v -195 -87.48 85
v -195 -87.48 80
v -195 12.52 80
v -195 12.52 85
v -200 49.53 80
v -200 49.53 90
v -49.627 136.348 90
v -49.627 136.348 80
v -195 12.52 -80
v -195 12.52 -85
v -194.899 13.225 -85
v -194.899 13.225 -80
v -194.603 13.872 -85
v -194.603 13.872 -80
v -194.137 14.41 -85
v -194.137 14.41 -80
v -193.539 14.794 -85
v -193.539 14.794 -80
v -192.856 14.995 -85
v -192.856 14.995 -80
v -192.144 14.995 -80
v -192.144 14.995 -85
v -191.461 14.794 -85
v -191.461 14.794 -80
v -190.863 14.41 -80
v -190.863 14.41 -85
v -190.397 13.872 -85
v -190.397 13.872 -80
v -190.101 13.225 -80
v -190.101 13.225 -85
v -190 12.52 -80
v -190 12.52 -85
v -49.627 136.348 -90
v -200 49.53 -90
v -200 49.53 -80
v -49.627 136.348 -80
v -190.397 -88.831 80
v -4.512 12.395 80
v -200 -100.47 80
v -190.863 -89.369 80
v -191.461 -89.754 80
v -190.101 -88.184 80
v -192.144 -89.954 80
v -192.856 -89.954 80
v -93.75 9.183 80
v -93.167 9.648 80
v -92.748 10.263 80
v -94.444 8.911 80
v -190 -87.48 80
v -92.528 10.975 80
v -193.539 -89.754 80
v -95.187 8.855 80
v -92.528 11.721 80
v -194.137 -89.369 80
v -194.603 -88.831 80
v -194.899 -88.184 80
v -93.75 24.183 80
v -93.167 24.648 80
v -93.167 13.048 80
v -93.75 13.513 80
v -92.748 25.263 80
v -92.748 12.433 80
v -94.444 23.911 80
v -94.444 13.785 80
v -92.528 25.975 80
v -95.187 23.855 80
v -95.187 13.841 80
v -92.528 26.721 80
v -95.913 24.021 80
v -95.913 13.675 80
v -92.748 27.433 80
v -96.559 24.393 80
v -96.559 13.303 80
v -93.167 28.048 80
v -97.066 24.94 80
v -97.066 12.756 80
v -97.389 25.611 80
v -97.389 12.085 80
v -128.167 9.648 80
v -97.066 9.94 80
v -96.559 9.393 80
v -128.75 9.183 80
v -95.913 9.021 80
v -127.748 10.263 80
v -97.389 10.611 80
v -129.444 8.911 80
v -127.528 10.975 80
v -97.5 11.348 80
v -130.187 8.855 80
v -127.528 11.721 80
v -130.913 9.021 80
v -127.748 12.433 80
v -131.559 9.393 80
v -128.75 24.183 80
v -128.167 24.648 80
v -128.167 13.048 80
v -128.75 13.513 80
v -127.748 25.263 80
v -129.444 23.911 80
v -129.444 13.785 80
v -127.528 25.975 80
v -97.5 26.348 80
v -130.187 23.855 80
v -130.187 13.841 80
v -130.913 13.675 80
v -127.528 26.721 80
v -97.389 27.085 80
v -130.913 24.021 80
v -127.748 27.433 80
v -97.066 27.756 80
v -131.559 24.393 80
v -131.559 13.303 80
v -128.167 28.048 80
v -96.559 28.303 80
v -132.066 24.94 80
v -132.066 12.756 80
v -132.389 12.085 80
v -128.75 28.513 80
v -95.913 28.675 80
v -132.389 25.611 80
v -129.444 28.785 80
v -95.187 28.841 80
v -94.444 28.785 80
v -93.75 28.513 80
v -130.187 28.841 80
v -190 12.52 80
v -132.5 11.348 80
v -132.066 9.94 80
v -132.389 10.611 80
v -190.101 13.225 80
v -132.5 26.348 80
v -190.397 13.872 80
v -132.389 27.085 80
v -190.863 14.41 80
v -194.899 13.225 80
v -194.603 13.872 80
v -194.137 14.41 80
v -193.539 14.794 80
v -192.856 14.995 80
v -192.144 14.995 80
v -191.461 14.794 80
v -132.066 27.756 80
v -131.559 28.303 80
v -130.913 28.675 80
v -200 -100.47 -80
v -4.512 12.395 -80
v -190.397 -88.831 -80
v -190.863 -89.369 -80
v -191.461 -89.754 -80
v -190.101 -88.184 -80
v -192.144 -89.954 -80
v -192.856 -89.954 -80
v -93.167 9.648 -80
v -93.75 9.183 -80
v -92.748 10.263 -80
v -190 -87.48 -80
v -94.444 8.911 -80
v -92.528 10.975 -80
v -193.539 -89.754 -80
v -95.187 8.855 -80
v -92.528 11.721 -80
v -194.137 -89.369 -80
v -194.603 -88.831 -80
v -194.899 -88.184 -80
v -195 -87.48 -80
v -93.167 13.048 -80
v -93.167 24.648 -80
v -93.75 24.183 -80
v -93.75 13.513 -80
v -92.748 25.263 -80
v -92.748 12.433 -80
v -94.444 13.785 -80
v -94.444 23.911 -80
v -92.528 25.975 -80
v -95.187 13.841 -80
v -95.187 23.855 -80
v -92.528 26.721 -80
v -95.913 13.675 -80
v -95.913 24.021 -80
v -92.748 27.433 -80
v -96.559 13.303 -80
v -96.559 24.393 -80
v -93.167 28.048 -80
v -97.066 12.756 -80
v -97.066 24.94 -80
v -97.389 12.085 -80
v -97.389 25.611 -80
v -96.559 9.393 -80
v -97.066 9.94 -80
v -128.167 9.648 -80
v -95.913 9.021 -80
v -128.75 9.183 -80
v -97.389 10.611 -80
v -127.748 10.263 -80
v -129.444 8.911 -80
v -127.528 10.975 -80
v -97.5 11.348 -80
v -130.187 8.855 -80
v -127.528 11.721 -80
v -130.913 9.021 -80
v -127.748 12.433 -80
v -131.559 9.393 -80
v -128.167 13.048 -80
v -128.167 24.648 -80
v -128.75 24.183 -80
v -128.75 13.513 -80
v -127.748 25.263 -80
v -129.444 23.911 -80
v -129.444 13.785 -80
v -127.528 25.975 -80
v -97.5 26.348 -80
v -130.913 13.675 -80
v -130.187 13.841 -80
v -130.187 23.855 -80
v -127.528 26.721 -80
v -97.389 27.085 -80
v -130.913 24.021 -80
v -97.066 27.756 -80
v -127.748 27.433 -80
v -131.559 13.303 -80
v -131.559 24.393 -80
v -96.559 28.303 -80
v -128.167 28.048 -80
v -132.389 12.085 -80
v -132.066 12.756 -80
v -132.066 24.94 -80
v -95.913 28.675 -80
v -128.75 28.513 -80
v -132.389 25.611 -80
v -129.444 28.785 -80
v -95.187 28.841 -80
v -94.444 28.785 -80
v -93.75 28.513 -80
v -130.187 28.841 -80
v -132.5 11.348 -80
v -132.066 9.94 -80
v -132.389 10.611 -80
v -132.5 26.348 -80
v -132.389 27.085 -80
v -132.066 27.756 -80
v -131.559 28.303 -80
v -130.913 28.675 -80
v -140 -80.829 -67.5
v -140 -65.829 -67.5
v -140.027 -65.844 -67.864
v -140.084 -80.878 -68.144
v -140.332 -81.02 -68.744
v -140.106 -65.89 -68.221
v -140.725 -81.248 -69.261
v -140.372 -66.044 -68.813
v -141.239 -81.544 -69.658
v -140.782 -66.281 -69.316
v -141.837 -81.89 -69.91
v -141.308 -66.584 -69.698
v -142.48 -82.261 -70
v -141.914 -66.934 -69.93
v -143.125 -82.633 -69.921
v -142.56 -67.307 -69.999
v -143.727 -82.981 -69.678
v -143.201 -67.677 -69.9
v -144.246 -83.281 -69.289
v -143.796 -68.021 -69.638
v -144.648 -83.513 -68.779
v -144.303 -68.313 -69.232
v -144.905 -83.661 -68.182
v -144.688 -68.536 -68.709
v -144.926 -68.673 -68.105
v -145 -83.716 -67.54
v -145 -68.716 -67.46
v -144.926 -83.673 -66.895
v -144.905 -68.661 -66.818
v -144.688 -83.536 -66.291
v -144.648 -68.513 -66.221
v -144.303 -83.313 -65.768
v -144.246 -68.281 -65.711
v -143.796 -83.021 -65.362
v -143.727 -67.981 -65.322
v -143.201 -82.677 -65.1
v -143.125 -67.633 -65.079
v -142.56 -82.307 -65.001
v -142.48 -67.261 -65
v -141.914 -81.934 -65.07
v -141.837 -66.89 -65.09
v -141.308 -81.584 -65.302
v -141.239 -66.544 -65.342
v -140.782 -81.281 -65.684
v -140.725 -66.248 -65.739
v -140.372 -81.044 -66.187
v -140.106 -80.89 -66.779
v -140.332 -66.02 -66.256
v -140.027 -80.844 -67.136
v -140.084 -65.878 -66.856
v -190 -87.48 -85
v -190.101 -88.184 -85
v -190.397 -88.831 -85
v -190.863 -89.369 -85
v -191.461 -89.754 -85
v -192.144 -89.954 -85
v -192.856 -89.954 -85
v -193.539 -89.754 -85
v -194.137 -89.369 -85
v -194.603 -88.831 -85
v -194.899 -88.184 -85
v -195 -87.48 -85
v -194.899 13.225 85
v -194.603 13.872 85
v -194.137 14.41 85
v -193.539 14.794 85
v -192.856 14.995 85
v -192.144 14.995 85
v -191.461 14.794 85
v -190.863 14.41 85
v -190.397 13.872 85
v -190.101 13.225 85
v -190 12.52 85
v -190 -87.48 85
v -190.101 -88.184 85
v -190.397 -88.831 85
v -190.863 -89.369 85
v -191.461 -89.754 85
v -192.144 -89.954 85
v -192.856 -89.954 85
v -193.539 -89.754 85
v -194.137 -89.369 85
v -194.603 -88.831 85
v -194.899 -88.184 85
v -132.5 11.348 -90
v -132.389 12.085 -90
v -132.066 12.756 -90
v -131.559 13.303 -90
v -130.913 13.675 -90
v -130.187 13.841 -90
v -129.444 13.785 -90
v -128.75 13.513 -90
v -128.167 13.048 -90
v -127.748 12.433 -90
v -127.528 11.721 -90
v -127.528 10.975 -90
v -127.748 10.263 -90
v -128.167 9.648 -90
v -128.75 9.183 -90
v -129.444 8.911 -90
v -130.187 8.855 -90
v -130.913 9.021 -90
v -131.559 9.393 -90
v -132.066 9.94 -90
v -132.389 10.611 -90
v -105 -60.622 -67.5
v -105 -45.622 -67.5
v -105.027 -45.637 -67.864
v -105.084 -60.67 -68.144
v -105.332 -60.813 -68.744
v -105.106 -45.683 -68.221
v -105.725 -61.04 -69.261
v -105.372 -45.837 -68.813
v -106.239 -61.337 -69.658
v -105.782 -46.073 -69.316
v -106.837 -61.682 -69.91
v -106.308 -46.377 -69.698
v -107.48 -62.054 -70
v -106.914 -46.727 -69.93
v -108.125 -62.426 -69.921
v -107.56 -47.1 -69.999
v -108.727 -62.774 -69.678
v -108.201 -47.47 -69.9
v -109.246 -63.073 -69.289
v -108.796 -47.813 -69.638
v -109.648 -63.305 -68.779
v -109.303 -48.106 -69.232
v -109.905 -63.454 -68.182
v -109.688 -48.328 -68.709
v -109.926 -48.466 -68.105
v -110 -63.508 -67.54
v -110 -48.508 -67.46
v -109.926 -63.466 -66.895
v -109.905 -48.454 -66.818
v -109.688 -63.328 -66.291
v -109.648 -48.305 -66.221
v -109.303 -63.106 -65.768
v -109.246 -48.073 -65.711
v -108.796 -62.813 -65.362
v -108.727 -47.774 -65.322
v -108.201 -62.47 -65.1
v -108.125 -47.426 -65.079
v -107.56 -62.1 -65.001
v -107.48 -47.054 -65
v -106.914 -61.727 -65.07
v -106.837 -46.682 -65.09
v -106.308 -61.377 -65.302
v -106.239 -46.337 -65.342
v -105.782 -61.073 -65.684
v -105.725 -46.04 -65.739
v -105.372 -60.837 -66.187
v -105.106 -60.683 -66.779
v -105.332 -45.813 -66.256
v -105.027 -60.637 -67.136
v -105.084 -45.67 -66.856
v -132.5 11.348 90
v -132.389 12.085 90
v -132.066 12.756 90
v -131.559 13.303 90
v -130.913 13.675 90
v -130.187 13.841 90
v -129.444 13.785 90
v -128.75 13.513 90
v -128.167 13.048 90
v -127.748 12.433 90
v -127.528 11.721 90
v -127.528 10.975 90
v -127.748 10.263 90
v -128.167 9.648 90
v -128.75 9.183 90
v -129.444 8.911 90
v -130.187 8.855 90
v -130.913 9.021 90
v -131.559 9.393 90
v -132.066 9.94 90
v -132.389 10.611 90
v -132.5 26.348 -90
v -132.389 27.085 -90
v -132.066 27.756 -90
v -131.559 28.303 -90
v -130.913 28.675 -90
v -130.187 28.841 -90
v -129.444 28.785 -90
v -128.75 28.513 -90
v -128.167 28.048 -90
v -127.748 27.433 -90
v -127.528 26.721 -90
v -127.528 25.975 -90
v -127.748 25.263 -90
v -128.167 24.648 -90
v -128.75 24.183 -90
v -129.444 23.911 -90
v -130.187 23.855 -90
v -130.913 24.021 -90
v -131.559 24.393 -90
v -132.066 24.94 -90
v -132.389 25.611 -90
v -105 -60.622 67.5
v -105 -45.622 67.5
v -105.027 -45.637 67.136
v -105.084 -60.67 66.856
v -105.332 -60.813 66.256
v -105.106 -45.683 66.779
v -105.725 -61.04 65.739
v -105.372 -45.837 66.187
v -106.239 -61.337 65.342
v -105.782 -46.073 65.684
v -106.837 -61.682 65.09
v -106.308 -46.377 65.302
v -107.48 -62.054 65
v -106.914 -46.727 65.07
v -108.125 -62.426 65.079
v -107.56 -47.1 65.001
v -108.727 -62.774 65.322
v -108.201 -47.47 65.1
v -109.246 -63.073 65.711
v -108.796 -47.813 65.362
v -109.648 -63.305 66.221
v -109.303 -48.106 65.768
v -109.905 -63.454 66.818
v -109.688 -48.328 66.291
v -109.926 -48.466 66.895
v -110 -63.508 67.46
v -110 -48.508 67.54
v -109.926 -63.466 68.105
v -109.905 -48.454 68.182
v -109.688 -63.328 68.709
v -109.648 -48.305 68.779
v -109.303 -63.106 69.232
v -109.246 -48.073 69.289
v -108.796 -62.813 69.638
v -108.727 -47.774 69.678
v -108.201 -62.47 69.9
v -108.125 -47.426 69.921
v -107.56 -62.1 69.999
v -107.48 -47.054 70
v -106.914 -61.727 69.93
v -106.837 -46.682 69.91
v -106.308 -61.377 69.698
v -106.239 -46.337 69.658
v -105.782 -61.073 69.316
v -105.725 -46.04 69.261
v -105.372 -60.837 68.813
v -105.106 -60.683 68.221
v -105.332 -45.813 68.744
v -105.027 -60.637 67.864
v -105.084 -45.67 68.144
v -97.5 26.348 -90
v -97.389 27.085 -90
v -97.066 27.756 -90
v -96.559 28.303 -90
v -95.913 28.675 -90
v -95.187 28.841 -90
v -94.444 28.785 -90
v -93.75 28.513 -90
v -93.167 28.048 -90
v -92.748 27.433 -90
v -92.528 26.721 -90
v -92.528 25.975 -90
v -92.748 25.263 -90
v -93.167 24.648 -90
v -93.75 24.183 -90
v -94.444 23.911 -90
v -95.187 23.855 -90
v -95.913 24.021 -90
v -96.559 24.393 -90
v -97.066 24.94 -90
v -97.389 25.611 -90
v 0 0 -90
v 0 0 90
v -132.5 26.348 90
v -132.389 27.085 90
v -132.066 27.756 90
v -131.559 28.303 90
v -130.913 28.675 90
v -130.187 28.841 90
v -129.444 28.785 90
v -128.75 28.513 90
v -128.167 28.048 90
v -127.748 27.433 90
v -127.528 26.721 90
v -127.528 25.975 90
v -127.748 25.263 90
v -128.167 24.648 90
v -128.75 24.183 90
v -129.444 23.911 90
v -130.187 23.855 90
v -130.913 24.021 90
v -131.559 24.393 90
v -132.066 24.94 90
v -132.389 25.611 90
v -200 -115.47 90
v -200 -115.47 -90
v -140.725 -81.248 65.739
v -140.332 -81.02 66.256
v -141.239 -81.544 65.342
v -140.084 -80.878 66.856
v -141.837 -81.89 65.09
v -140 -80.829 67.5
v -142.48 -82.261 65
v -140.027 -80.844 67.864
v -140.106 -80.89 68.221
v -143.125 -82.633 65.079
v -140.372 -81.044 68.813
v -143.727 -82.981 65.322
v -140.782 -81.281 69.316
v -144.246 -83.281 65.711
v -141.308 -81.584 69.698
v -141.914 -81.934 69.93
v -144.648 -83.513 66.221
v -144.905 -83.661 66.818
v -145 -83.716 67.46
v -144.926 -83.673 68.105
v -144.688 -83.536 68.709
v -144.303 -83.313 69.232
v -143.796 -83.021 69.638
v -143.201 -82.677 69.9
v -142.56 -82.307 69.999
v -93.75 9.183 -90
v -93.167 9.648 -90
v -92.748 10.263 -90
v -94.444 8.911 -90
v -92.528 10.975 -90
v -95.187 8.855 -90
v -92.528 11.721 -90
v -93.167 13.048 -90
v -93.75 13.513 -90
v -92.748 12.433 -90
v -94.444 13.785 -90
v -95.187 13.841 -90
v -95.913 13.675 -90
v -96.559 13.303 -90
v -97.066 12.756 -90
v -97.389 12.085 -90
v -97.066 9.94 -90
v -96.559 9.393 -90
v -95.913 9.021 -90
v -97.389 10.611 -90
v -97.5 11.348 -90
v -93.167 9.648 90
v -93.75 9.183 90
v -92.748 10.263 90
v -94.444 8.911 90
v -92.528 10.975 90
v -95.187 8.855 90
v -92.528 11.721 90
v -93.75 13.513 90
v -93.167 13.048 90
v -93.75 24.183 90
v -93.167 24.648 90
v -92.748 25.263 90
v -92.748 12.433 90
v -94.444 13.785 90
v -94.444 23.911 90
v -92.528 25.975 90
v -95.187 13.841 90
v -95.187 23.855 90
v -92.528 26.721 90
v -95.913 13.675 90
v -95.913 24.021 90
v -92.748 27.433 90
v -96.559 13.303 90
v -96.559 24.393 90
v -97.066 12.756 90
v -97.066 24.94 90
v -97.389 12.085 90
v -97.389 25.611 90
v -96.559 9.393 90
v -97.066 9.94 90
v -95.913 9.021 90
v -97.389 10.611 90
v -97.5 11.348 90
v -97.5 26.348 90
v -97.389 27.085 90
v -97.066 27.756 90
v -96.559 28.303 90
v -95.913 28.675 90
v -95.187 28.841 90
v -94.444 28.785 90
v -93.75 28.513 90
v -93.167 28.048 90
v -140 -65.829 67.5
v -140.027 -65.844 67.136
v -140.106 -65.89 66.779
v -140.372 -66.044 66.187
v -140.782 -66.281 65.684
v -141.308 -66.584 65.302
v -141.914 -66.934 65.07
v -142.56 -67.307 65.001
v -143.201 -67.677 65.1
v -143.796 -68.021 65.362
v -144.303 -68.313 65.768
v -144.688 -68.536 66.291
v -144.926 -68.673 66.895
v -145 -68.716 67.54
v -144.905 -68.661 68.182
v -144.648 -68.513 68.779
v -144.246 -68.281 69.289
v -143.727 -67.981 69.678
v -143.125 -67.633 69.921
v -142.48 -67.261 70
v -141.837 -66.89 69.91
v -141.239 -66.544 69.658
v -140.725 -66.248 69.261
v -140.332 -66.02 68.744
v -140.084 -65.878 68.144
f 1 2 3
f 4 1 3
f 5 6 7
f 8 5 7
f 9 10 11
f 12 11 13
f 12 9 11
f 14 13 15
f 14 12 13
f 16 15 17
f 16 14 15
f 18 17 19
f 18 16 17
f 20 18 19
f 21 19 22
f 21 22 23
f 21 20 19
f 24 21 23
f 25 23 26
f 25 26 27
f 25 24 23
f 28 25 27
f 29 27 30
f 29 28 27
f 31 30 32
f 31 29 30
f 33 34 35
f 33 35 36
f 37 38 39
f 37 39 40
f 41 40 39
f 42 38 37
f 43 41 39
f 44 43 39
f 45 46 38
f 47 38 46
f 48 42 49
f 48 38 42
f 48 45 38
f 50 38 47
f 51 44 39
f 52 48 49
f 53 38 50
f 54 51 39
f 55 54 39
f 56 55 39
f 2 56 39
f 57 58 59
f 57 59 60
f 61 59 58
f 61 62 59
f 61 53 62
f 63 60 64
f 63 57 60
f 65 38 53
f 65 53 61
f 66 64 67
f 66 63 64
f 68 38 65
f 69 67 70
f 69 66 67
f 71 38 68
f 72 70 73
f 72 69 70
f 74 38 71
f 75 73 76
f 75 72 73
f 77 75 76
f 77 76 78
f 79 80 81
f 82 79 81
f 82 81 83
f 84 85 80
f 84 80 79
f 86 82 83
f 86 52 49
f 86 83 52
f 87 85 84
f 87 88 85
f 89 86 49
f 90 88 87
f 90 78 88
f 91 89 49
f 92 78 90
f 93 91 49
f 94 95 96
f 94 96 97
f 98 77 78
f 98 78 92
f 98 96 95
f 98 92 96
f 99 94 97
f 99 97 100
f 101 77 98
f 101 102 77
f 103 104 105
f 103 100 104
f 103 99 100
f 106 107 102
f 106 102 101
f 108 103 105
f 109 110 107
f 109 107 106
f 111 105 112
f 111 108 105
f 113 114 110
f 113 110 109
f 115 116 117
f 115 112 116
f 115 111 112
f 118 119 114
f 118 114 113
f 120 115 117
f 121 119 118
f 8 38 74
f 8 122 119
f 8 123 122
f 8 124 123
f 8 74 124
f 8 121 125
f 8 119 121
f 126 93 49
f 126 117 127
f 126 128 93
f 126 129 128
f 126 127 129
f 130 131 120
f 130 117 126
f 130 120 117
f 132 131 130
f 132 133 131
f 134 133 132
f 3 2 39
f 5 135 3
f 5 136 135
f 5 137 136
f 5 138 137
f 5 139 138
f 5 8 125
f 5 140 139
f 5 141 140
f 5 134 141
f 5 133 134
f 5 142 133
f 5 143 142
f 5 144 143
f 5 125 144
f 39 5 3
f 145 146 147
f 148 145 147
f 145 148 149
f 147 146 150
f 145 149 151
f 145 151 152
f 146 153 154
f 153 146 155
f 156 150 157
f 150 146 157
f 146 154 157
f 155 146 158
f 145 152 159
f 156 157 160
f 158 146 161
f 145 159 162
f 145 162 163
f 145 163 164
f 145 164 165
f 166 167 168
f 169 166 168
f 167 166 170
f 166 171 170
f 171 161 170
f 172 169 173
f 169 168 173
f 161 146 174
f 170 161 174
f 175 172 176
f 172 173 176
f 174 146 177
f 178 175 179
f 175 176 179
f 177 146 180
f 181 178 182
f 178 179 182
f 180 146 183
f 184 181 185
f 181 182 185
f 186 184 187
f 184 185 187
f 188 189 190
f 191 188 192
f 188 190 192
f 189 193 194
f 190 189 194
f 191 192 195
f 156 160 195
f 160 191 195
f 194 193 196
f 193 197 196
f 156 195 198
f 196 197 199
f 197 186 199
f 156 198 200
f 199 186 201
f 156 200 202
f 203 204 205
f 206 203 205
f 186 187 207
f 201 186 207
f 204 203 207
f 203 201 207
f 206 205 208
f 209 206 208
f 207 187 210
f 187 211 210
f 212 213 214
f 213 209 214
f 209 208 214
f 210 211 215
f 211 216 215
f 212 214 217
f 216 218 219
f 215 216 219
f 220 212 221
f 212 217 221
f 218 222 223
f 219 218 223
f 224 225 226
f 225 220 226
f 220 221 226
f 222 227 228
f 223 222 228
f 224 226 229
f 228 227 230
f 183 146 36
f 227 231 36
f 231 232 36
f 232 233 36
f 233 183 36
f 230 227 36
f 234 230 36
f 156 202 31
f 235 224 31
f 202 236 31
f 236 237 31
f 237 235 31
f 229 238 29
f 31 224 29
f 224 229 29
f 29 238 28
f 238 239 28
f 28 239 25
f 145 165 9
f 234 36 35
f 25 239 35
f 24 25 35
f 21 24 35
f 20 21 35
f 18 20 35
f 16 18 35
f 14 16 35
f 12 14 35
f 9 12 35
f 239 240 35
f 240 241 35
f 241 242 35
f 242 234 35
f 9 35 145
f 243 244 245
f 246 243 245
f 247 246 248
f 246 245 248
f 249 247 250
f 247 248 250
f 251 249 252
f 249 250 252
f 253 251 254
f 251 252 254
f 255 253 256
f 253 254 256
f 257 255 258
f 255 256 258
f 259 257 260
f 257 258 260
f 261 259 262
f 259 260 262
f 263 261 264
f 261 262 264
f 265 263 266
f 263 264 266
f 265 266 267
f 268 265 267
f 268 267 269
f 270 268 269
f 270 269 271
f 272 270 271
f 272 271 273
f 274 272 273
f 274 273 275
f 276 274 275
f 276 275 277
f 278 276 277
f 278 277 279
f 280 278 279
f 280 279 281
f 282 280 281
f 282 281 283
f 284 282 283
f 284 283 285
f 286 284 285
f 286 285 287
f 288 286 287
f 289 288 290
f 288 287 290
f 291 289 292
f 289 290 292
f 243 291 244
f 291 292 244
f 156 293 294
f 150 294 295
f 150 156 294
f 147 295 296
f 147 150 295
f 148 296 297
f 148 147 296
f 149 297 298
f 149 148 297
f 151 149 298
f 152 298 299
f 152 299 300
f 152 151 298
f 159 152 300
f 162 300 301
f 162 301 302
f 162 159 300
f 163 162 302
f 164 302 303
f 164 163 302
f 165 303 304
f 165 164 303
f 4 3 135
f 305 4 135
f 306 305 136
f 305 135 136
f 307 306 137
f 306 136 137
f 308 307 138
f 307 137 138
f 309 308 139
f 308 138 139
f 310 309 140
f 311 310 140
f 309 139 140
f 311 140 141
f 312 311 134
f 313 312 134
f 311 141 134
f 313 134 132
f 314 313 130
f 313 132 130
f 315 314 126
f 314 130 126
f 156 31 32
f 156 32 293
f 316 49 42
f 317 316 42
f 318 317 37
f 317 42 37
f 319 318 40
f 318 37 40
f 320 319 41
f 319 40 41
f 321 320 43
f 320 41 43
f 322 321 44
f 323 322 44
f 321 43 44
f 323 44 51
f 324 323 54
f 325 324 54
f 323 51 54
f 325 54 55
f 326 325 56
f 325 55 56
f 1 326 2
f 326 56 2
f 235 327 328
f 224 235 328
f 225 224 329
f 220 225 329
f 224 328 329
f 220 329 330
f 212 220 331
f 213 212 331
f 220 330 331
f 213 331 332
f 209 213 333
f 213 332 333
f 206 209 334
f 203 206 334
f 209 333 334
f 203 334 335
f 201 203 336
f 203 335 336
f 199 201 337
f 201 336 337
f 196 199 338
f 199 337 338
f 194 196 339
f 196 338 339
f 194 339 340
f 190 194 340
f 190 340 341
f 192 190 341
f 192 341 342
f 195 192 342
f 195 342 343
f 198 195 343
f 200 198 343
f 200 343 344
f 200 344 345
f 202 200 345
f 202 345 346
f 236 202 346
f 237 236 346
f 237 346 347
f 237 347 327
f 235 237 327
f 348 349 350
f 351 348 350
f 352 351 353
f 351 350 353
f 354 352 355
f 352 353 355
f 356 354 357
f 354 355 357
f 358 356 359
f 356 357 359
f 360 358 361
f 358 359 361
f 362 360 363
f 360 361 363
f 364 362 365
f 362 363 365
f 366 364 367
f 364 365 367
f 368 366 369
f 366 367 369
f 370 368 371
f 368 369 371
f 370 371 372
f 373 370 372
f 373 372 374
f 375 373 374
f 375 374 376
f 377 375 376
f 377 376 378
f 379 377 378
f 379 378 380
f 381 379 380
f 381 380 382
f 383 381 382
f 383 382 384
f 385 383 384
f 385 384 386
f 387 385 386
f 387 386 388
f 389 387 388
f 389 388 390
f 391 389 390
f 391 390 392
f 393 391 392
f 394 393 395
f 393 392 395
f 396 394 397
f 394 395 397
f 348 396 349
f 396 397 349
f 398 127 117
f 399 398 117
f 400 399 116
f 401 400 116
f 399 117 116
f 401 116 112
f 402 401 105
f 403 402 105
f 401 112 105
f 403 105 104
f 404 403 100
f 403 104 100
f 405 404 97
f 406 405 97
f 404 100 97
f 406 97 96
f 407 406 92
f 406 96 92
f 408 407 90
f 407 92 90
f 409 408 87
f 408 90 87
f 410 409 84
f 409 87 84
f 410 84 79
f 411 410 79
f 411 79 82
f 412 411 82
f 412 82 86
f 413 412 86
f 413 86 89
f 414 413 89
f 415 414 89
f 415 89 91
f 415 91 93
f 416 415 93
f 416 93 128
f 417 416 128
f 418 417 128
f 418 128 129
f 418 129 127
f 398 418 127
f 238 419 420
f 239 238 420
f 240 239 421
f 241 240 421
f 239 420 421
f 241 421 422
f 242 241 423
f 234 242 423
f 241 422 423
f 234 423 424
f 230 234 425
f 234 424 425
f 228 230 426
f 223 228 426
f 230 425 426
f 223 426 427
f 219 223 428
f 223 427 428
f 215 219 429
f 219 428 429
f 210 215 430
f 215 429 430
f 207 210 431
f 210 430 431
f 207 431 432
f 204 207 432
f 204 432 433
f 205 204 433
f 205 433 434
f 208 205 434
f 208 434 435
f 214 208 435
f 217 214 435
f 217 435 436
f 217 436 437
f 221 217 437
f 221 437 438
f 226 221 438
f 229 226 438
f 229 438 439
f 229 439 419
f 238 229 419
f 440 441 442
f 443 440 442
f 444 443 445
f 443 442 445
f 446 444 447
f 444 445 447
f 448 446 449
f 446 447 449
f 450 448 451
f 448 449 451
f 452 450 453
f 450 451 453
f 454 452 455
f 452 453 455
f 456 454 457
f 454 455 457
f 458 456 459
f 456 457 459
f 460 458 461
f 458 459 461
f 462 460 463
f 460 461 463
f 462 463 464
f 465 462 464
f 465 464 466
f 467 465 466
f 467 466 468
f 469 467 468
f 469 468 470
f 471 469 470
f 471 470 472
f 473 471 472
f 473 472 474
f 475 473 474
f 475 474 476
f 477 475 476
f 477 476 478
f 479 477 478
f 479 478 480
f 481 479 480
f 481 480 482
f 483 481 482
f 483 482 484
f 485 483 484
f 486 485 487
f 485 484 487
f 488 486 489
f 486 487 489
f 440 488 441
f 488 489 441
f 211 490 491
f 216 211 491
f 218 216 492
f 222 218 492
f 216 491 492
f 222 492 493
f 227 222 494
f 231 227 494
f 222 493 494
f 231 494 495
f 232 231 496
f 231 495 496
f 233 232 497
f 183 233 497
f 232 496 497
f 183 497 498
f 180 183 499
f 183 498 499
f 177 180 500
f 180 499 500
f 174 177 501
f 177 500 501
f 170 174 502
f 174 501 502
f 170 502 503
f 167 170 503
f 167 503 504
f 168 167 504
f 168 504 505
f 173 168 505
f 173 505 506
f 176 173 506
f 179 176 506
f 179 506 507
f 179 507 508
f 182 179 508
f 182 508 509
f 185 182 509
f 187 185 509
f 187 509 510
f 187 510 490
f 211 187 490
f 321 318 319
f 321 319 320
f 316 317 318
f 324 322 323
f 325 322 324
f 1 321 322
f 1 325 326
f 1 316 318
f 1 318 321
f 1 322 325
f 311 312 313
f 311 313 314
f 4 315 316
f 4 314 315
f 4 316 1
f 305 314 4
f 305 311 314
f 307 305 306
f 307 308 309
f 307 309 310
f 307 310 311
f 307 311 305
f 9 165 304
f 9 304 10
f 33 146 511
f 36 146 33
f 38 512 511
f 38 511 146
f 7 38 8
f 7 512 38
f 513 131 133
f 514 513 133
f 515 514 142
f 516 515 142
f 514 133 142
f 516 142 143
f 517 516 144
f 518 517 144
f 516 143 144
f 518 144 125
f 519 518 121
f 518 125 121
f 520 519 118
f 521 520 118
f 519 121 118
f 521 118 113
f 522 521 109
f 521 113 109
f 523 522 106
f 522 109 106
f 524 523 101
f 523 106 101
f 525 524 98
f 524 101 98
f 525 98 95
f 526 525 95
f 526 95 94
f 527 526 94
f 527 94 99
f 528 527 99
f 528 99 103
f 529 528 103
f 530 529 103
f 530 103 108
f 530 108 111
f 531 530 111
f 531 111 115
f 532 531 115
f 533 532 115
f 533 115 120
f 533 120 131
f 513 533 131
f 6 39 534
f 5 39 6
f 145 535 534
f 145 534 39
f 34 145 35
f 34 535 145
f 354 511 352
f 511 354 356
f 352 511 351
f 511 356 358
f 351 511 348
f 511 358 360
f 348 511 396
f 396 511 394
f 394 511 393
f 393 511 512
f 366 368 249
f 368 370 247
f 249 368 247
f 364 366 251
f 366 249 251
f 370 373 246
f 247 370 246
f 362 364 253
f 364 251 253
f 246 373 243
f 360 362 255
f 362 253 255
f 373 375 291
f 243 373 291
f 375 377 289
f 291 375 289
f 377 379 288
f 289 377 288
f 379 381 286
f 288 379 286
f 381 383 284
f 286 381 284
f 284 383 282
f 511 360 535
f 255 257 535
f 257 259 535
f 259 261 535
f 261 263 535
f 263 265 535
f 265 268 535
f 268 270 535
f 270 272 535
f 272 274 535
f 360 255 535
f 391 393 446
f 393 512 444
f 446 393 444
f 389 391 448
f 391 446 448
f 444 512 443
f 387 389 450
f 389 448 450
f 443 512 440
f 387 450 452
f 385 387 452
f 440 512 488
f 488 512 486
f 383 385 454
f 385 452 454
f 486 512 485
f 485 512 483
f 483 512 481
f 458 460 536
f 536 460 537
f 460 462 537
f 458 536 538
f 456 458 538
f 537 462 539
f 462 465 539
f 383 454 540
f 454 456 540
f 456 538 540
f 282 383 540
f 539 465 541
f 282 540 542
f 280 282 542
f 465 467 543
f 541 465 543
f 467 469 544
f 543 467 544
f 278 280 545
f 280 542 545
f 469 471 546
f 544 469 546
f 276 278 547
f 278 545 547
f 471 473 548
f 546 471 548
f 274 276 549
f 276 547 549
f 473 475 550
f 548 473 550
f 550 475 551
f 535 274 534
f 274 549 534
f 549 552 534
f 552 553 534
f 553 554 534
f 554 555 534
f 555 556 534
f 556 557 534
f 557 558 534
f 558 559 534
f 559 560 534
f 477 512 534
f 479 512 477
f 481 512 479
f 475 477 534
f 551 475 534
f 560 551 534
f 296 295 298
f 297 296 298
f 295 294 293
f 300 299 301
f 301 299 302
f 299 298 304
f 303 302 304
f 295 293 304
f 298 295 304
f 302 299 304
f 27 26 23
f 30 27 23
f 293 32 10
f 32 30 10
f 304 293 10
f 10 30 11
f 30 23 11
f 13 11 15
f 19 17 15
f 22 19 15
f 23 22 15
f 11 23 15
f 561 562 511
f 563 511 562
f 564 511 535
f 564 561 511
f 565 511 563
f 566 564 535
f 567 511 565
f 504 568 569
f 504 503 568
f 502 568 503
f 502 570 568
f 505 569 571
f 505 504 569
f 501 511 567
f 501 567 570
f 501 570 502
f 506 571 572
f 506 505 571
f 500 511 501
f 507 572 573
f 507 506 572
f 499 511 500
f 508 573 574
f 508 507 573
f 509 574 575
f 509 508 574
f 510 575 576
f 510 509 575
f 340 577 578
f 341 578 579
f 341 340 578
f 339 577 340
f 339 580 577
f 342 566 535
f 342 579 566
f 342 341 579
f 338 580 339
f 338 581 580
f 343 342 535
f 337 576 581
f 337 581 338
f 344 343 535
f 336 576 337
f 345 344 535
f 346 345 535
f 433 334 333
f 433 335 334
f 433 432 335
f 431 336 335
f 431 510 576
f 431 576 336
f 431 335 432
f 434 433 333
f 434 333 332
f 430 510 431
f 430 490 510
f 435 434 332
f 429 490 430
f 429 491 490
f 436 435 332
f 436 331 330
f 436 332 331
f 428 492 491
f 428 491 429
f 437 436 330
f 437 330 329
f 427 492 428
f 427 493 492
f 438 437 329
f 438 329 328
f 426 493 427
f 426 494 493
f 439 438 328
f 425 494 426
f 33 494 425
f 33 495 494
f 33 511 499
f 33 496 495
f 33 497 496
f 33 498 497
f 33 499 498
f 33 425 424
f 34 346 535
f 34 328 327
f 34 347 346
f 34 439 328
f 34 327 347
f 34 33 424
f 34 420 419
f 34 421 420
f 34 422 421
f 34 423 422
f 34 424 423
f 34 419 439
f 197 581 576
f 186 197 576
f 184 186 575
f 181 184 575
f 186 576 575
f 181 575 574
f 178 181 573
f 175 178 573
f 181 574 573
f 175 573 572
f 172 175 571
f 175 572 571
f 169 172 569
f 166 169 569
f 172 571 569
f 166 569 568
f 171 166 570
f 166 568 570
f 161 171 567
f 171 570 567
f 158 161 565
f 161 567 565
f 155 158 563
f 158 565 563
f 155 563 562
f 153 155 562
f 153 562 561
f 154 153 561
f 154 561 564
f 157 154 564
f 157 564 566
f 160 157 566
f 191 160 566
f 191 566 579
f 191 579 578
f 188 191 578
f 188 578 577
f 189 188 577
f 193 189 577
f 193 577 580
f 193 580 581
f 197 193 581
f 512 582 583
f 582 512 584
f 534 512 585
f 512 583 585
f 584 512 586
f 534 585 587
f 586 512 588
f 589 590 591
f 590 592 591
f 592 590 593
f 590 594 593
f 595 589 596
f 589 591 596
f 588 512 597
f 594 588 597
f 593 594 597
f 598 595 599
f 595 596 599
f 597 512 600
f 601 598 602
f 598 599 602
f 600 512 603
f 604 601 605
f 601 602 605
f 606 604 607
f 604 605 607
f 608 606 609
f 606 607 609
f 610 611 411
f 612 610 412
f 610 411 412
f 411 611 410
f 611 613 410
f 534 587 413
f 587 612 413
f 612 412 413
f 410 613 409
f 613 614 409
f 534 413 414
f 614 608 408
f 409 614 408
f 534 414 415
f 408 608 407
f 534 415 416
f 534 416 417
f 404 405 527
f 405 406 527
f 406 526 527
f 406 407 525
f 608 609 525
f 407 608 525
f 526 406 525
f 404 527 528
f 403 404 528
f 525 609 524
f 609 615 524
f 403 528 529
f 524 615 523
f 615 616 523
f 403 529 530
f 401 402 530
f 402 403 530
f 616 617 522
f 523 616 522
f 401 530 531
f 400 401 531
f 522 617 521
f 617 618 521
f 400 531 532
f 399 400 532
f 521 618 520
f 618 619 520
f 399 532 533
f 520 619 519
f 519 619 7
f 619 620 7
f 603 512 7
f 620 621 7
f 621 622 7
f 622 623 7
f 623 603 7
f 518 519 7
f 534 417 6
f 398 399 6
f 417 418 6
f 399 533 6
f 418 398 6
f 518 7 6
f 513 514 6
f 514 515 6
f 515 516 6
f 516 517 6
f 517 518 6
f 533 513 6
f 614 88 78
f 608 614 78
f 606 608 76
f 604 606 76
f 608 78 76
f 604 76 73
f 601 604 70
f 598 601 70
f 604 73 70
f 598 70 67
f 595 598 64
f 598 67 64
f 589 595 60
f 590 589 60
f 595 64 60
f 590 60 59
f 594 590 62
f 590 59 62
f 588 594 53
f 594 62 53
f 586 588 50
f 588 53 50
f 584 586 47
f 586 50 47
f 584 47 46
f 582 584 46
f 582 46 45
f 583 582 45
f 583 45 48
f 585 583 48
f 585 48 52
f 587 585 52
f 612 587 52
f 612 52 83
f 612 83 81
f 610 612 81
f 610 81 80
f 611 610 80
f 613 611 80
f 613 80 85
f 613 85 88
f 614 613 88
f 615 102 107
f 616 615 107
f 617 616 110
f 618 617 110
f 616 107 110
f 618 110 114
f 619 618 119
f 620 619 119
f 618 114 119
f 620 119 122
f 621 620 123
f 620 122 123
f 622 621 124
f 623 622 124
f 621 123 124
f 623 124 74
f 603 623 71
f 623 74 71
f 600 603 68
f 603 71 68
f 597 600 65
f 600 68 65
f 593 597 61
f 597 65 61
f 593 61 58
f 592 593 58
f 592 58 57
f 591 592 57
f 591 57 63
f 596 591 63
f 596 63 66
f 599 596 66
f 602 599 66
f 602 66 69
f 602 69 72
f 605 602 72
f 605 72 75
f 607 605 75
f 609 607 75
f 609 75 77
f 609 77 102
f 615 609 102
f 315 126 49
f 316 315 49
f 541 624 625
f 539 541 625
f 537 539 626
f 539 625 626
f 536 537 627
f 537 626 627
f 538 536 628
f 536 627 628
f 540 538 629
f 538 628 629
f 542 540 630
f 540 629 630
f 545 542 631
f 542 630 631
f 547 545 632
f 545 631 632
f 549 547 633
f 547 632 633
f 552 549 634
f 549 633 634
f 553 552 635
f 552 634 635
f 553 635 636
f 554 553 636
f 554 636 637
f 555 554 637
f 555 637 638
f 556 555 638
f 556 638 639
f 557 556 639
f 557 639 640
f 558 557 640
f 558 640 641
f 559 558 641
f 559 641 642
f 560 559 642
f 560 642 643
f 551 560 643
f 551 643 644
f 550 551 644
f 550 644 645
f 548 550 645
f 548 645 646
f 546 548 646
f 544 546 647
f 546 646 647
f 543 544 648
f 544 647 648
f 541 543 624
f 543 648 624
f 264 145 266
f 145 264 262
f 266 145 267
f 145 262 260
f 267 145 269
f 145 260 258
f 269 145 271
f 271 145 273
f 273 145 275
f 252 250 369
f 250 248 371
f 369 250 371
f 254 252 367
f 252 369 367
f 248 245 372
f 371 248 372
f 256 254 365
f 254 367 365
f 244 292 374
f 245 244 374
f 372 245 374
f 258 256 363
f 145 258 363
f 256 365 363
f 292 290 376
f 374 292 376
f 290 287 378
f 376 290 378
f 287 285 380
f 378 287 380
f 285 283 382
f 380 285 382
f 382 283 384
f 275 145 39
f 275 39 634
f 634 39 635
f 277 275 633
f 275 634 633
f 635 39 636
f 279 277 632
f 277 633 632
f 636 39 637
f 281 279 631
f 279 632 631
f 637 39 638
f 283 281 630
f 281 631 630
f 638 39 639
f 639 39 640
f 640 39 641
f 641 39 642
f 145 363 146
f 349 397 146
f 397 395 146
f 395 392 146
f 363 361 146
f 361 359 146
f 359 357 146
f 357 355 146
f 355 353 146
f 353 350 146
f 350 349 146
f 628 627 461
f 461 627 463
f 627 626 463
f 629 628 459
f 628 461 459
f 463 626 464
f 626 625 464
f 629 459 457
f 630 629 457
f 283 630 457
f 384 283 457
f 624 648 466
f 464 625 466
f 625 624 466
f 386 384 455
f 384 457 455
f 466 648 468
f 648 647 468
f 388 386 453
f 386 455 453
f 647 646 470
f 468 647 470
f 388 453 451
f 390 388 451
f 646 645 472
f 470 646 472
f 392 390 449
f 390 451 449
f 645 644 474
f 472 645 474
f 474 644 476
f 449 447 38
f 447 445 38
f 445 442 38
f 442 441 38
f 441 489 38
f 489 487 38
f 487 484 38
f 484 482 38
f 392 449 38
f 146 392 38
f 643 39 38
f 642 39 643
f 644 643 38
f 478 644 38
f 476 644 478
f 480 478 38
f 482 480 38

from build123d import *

# Parameters (mm, degrees)
SKETCH1_W            = 50
SKETCH1_H            = 150
SKETCH1_R            = 2.5
BOSS_EXTRUDE1_DEPTH  = 15
BOSS_EXTRUDE2_DEPTH  = 90
SKETCH3_W            = 250
SKETCH3_H            = 15
BOSS_EXTRUDE3_DEPTH  = 150
BOSS_EXTRUDE8_DEPTH  = 10
CUT_EXTRUDE1_DEPTH   = 10
SKETCH10_W           = 115
SKETCH10_H           = 165
BOSS_EXTRUDE12_DEPTH = 15
CUT_EXTRUDE3_DEPTH   = 181
SKETCH13_R           = 2.5
CUT_EXTRUDE4_DEPTH   = 116.470053838
SKETCH14_R           = 2.5
CUT_EXTRUDE5_DEPTH   = 181


with BuildPart() as part:
    # Sketch1 → Boss-Extrude1 (new body)
    with BuildSketch(Plane(origin=(0, 0, 0), x_dir=(1, 0, 0), z_dir=(0, 1, 0))):
        Polygon((0, 90), (0, 75), (50, 75), (50, -75), (0, -75), (0, -90), (250, -90), (250, 90), align=None)
        with Locations((25, 0)):
            Rectangle(SKETCH1_W, SKETCH1_H)
        with Locations((7.5, -67.5)):
            Circle(SKETCH1_R, mode=Mode.SUBTRACT)
        with Locations((42.5, -67.5)):
            Circle(SKETCH1_R, mode=Mode.SUBTRACT)
        with Locations((7.5, 67.5)):
            Circle(SKETCH1_R, mode=Mode.SUBTRACT)
        with Locations((42.5, 67.5)):
            Circle(SKETCH1_R, mode=Mode.SUBTRACT)
    extrude(amount=BOSS_EXTRUDE1_DEPTH)

    # Sketch2 → Boss-Extrude2 (add, symmetric)
    with BuildSketch(Plane.XY):
        Polygon((0, 0), (-200, -115.470053838), (-200, -100.470053838), (0, 15), align=None)
    extrude(amount=BOSS_EXTRUDE2_DEPTH, both=True)

    # Sketch3 → Boss-Extrude3 (add)
    with BuildSketch(Plane(origin=(0, 15, 0), x_dir=(1, 0, 0), z_dir=(0, 1, 0))):
        with Locations((125, 82.5)):
            Rectangle(SKETCH3_W, SKETCH3_H)
        with Locations((125, -82.5)):
            Rectangle(SKETCH3_W, SKETCH3_H)
    extrude(amount=BOSS_EXTRUDE3_DEPTH)

    # Sketch8 → Boss-Extrude8 (add)
    with BuildSketch(Plane.XY.offset(90)):
        Polygon((0, 15), (-200, -100.470053838), (-200, 49.529946162), (0, 165), align=None)
    boss_extrude8 = extrude(amount=-BOSS_EXTRUDE8_DEPTH)

    # Mirror1: Boss-Extrude8 across plane
    add(boss_extrude8.mirror(Plane.XY))

    # Sketch9 → Cut-Extrude1 (cut)
    with BuildSketch(Plane.XY.offset(-75)):
        with BuildLine():
            Line((-190, 12.520327219), (-190, -87.479672781))
            ThreePointArc((-190, -87.479672781), (-192.5, -89.979672781), (-195, -87.479672781))
            Line((-195, -87.479672781), (-195, 12.520327219))
            ThreePointArc((-195, 12.520327219), (-192.5, 15.020327219), (-190, 12.520327219))
        make_face()
    cut_extrude1 = extrude(amount=-CUT_EXTRUDE1_DEPTH, mode=Mode.SUBTRACT)

    # Mirror2: Cut-Extrude1 across plane
    add(cut_extrude1.mirror(Plane.XY), mode=Mode.SUBTRACT)

    # Sketch10 → Boss-Extrude12 (add)
    with BuildSketch(Plane(origin=(250, 0, 0), x_dir=(0, 0, -1), z_dir=(1, 0, 0))):
        with Locations((-32.5, 82.5)):
            Rectangle(SKETCH10_W, SKETCH10_H)
    boss_extrude12 = extrude(amount=-BOSS_EXTRUDE12_DEPTH)

    # Mirror3: Boss-Extrude12 across plane
    add(boss_extrude12.mirror(Plane.XY))

    # Sketch12 → Cut-Extrude3 (cut, through all)
    with BuildSketch(Plane.XY.offset(90)):
        Polygon((0, 165), (250, 165), (250, 0), (0, 0), (-49.62663195, 136.348050685), align=None)
    extrude(amount=-CUT_EXTRUDE3_DEPTH, mode=Mode.SUBTRACT)

    # Sketch13 → Cut-Extrude4 (cut, through all)
    with BuildSketch(Plane(origin=(0, 0, 0), x_dir=(1, 0, 0), z_dir=(0, 1, 0))):
        with Locations((-142.5, 67.5)):
            Circle(SKETCH13_R)
        with Locations((-107.5, 67.5)):
            Circle(SKETCH13_R)
        with Locations((-142.5, -67.5)):
            Circle(SKETCH13_R)
        with Locations((-107.5, -67.5)):
            Circle(SKETCH13_R)
    extrude(amount=-CUT_EXTRUDE4_DEPTH, mode=Mode.SUBTRACT)

    # Sketch14 → Cut-Extrude5 (cut, through all)
    with BuildSketch(Plane(origin=(0, 0, -90), x_dir=(-1, 0, 0), z_dir=(0, 0, -1))):
        with Locations((95, 11.348050685)):
            Circle(SKETCH14_R)
        with Locations((130, 11.348050685)):
            Circle(SKETCH14_R)
        with Locations((95, 26.348050685)):
            Circle(SKETCH14_R)
        with Locations((130, 26.348050685)):
            Circle(SKETCH14_R)
    extrude(amount=-CUT_EXTRUDE5_DEPTH, mode=Mode.SUBTRACT)


solid = part.part
